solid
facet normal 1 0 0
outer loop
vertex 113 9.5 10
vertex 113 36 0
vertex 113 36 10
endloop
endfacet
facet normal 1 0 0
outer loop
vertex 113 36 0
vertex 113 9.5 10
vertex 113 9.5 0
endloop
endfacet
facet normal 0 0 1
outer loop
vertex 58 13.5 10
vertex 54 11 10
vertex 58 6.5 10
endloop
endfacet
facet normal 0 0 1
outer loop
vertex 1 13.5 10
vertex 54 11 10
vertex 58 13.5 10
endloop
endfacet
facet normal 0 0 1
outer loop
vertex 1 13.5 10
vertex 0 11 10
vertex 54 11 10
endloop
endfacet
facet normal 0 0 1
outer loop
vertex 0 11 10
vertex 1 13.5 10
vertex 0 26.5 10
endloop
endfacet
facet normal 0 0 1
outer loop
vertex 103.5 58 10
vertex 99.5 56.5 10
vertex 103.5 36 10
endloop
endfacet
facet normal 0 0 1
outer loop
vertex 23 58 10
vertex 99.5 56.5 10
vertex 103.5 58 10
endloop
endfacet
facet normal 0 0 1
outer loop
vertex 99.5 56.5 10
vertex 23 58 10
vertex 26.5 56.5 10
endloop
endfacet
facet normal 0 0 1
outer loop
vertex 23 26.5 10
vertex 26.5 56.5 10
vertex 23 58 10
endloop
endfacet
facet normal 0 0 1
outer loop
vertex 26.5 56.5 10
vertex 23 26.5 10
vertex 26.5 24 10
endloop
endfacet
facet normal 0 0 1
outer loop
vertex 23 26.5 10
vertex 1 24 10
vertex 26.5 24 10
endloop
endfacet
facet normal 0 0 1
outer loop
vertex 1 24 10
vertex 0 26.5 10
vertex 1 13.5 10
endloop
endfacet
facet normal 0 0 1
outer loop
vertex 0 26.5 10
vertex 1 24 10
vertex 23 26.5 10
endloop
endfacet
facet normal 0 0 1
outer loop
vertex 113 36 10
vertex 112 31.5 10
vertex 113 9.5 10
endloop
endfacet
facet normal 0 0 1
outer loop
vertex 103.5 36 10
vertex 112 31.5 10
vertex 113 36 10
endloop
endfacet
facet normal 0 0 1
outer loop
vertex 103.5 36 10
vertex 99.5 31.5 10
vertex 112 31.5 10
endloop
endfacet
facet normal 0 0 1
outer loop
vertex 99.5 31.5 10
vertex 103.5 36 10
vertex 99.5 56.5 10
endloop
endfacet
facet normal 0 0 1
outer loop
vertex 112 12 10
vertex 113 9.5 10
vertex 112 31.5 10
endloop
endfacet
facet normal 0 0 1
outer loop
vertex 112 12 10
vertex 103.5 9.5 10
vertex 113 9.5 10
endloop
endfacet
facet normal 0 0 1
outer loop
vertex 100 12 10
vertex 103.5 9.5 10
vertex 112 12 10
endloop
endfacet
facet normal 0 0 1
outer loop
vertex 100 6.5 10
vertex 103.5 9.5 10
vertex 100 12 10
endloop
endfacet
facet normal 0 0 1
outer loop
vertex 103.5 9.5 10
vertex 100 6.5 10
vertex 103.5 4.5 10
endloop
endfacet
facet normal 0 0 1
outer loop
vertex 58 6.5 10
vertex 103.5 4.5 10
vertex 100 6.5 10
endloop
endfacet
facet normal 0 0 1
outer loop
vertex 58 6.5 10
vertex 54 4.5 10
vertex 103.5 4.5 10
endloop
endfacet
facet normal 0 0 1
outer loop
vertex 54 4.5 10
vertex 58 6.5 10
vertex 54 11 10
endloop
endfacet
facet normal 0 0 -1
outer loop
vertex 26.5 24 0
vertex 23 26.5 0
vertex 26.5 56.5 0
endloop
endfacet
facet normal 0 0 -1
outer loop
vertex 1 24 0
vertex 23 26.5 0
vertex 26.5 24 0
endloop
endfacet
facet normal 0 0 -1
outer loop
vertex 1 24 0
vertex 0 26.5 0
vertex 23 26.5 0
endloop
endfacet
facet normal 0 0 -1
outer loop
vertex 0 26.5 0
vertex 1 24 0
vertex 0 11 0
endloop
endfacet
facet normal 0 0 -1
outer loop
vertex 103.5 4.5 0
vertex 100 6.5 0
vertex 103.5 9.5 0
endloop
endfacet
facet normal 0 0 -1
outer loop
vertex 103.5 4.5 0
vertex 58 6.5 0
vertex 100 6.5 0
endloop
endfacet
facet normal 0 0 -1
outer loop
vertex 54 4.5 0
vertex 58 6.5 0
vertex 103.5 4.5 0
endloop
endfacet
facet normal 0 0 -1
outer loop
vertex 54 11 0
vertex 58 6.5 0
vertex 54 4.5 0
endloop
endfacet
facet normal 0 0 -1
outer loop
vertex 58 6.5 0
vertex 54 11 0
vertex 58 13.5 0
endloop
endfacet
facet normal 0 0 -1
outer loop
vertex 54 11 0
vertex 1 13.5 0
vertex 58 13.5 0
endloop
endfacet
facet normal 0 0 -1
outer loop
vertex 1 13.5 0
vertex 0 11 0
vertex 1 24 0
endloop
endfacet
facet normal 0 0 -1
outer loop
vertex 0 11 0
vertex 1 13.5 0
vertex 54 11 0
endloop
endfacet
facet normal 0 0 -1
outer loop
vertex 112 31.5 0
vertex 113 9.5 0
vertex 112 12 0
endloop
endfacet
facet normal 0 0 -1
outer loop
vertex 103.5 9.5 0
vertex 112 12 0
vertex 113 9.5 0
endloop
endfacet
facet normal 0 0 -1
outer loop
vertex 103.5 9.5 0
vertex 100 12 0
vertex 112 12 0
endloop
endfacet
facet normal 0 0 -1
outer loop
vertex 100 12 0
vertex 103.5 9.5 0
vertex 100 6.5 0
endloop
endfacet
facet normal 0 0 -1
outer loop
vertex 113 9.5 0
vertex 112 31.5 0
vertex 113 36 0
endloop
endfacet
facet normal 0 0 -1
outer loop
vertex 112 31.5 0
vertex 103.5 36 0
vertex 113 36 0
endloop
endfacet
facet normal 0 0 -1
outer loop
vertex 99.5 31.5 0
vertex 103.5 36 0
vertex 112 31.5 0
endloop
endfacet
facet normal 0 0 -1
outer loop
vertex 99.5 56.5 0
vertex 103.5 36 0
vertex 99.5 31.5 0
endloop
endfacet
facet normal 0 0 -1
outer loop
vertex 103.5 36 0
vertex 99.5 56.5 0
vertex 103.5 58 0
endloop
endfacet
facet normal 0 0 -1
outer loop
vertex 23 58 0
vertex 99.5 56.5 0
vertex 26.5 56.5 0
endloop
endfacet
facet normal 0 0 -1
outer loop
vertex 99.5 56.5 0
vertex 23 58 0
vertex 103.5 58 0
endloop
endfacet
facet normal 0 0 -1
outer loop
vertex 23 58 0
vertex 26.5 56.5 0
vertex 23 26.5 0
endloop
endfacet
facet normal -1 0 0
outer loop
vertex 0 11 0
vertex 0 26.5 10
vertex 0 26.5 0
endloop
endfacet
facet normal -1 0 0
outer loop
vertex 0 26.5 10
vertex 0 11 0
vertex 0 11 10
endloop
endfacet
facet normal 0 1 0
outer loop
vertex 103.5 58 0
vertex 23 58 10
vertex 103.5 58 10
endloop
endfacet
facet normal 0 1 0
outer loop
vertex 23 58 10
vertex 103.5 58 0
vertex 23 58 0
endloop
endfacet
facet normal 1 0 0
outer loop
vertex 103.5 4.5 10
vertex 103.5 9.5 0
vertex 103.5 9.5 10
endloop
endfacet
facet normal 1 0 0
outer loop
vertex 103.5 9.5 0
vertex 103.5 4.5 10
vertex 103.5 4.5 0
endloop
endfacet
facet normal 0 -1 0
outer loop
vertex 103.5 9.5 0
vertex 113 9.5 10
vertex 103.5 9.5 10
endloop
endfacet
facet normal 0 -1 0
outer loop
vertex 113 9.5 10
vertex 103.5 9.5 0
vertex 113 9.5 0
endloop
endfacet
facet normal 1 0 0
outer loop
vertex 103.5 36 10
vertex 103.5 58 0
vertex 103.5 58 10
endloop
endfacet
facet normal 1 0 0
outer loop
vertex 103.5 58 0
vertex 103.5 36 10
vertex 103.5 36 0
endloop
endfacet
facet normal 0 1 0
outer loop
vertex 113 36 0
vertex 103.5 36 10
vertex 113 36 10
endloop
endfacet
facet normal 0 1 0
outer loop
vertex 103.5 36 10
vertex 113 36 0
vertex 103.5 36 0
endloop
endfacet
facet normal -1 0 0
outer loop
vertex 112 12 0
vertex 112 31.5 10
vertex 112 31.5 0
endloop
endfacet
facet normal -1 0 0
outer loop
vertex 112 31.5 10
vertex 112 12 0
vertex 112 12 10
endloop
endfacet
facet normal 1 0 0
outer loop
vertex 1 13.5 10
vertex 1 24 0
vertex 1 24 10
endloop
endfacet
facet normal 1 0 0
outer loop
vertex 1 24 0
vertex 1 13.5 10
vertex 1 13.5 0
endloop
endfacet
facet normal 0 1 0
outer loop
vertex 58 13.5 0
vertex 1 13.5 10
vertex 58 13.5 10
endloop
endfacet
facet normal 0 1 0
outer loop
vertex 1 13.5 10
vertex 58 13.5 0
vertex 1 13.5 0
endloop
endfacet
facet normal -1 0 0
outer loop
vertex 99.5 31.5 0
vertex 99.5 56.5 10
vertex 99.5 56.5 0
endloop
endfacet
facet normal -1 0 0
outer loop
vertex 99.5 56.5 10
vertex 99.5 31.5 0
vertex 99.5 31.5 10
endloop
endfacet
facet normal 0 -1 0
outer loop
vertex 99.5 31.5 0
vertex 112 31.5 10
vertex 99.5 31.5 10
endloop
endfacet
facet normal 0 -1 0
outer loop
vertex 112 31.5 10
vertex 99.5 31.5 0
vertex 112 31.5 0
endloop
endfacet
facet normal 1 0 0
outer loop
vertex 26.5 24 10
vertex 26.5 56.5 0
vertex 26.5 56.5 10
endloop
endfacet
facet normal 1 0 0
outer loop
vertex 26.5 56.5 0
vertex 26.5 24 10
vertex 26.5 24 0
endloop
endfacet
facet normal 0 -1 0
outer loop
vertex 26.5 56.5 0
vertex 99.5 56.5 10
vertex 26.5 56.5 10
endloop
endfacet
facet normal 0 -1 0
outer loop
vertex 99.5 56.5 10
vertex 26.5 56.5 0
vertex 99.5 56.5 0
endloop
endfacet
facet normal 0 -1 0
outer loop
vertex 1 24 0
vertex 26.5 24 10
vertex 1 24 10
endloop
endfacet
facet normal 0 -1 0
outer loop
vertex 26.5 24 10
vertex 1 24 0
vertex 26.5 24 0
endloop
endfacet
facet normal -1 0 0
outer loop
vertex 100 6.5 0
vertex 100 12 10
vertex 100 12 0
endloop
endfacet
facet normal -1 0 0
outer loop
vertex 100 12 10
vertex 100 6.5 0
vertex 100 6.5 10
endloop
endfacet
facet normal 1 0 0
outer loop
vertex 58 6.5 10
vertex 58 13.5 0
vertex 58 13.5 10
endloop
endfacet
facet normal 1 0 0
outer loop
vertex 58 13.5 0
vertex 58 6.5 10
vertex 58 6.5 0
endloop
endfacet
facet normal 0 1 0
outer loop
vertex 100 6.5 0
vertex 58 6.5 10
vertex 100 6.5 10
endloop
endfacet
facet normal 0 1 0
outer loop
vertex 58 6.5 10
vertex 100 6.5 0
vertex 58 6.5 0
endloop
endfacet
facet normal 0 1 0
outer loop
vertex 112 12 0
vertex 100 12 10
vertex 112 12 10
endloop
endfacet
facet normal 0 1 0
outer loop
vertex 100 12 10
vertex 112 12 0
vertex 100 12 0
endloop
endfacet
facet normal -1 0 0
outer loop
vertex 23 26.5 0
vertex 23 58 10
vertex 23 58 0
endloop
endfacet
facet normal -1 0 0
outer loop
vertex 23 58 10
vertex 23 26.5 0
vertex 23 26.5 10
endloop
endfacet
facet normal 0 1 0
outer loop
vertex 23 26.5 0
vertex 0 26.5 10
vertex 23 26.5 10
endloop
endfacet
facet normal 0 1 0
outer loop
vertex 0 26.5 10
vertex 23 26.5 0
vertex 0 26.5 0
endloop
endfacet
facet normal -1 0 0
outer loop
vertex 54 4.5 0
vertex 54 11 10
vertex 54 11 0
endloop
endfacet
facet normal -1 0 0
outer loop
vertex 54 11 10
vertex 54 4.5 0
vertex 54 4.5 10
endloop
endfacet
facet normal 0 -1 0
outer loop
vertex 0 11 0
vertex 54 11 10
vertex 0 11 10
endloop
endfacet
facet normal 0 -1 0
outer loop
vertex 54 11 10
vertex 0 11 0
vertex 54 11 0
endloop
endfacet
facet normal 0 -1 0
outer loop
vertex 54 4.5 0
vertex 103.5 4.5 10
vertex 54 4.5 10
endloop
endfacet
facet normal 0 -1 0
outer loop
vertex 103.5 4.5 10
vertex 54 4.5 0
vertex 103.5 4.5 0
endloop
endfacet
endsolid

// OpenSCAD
// file: ../src/SPACEDOS02A_CAD01A.scad
//Rozmery kovové krabicky vnitrni
krabicka_x=113;
krabicka_y=58;
krabicka_z=10;  //38

krabicka_otvor_hrana=9.5;

//Rozmery casty modulu
pcb_x=111;
pcb_y=6;

baterka_x=73;
baterka_y=37;

konektor_x=12.5;
konektor_y=12;

SD_karta_x=42;
SD_karta_y=13;

SD_karta_mensi_x=12;
SD_karta_mensi_y=7.5;

dioda_x=25.5;
dioda_y=4.5;

SPACEDOS02A_CAD01A();

module SPACEDOS02A_CAD01A()
    {
    difference(){

        KRABICKA();
            translate([1,19.5,-0.5]) 
                MODUL();    
                } 
    }


module KRABICKA()
    {
    difference(){
        cube([krabicka_x,krabicka_y,krabicka_z],center=false);

//otvory
        translate([0,0,-0.5]) 
            cube([krabicka_otvor_hrana,krabicka_otvor_hrana,krabicka_z+1],center=false);
    
        translate([krabicka_x-krabicka_otvor_hrana,0,-0.5]) 
            cube([krabicka_otvor_hrana,krabicka_otvor_hrana,krabicka_z+1],center=false);
        
        translate([0,krabicka_y-krabicka_otvor_hrana,-0.5]) 
            cube([krabicka_otvor_hrana,krabicka_otvor_hrana,krabicka_z+1],center=false);
    
        translate([krabicka_x-krabicka_otvor_hrana,krabicka_y-krabicka_otvor_hrana-12-0.5]) 
            cube([krabicka_otvor_hrana,krabicka_otvor_hrana+20,krabicka_z+1],center=false);


                }
    }   


module MODUL()
    {

    //pcb
    translate([0,-pcb_y,-0.5]) 
        cube([pcb_x,pcb_y,krabicka_z+1],center=false);

    //konektor
    translate([pcb_x-konektor_x,0,-0.5]) 
        cube([konektor_x,konektor_y,krabicka_z+1],center=false);

    //baterka
    translate([pcb_x-konektor_x-baterka_x,0,-0.5]) 
        cube([baterka_x,baterka_y,krabicka_z+1],center=false);

    //dioda
    translate([pcb_x-konektor_x-baterka_x-dioda_x,0,-0.5]) 
        cube([dioda_x,dioda_y,krabicka_z+1],center=false);

    //SD karta
    translate([pcb_x-SD_karta_x-SD_karta_mensi_x,-SD_karta_y,-0.5]) 
        cube([SD_karta_x,SD_karta_y,krabicka_z+1],center=false);
        
    //SD karta mensi otvor
    translate([pcb_x-SD_karta_mensi_x,-SD_karta_mensi_y,-0.5]) 
        cube([SD_karta_mensi_x,SD_karta_mensi_y,krabicka_z+1],center=false);  
     
    //vyrez levy horni
    translate([-2,7,-0.5]) 
       cube([24,60,krabicka_z+1],center=false);  
        
         //vyrez levy dolni
    translate([-2,-21,-0.5]) 
        cube([55,12.5,krabicka_z+1],center=false);  
     
   //vyrez pravy dolni
    translate([-2,-21,-0.5]) 
        cube([krabicka_x+4,6,krabicka_z+1],center=false);     
        
       //vyrez pravy horni
    translate([-2,7,-0.5]) 
       cube([24,60,krabicka_z+1],center=false);    
    
     }
// main file
use <../src/SPACEDOS02A_CAD01A.scad>



SPACEDOS02A_CAD01A();
